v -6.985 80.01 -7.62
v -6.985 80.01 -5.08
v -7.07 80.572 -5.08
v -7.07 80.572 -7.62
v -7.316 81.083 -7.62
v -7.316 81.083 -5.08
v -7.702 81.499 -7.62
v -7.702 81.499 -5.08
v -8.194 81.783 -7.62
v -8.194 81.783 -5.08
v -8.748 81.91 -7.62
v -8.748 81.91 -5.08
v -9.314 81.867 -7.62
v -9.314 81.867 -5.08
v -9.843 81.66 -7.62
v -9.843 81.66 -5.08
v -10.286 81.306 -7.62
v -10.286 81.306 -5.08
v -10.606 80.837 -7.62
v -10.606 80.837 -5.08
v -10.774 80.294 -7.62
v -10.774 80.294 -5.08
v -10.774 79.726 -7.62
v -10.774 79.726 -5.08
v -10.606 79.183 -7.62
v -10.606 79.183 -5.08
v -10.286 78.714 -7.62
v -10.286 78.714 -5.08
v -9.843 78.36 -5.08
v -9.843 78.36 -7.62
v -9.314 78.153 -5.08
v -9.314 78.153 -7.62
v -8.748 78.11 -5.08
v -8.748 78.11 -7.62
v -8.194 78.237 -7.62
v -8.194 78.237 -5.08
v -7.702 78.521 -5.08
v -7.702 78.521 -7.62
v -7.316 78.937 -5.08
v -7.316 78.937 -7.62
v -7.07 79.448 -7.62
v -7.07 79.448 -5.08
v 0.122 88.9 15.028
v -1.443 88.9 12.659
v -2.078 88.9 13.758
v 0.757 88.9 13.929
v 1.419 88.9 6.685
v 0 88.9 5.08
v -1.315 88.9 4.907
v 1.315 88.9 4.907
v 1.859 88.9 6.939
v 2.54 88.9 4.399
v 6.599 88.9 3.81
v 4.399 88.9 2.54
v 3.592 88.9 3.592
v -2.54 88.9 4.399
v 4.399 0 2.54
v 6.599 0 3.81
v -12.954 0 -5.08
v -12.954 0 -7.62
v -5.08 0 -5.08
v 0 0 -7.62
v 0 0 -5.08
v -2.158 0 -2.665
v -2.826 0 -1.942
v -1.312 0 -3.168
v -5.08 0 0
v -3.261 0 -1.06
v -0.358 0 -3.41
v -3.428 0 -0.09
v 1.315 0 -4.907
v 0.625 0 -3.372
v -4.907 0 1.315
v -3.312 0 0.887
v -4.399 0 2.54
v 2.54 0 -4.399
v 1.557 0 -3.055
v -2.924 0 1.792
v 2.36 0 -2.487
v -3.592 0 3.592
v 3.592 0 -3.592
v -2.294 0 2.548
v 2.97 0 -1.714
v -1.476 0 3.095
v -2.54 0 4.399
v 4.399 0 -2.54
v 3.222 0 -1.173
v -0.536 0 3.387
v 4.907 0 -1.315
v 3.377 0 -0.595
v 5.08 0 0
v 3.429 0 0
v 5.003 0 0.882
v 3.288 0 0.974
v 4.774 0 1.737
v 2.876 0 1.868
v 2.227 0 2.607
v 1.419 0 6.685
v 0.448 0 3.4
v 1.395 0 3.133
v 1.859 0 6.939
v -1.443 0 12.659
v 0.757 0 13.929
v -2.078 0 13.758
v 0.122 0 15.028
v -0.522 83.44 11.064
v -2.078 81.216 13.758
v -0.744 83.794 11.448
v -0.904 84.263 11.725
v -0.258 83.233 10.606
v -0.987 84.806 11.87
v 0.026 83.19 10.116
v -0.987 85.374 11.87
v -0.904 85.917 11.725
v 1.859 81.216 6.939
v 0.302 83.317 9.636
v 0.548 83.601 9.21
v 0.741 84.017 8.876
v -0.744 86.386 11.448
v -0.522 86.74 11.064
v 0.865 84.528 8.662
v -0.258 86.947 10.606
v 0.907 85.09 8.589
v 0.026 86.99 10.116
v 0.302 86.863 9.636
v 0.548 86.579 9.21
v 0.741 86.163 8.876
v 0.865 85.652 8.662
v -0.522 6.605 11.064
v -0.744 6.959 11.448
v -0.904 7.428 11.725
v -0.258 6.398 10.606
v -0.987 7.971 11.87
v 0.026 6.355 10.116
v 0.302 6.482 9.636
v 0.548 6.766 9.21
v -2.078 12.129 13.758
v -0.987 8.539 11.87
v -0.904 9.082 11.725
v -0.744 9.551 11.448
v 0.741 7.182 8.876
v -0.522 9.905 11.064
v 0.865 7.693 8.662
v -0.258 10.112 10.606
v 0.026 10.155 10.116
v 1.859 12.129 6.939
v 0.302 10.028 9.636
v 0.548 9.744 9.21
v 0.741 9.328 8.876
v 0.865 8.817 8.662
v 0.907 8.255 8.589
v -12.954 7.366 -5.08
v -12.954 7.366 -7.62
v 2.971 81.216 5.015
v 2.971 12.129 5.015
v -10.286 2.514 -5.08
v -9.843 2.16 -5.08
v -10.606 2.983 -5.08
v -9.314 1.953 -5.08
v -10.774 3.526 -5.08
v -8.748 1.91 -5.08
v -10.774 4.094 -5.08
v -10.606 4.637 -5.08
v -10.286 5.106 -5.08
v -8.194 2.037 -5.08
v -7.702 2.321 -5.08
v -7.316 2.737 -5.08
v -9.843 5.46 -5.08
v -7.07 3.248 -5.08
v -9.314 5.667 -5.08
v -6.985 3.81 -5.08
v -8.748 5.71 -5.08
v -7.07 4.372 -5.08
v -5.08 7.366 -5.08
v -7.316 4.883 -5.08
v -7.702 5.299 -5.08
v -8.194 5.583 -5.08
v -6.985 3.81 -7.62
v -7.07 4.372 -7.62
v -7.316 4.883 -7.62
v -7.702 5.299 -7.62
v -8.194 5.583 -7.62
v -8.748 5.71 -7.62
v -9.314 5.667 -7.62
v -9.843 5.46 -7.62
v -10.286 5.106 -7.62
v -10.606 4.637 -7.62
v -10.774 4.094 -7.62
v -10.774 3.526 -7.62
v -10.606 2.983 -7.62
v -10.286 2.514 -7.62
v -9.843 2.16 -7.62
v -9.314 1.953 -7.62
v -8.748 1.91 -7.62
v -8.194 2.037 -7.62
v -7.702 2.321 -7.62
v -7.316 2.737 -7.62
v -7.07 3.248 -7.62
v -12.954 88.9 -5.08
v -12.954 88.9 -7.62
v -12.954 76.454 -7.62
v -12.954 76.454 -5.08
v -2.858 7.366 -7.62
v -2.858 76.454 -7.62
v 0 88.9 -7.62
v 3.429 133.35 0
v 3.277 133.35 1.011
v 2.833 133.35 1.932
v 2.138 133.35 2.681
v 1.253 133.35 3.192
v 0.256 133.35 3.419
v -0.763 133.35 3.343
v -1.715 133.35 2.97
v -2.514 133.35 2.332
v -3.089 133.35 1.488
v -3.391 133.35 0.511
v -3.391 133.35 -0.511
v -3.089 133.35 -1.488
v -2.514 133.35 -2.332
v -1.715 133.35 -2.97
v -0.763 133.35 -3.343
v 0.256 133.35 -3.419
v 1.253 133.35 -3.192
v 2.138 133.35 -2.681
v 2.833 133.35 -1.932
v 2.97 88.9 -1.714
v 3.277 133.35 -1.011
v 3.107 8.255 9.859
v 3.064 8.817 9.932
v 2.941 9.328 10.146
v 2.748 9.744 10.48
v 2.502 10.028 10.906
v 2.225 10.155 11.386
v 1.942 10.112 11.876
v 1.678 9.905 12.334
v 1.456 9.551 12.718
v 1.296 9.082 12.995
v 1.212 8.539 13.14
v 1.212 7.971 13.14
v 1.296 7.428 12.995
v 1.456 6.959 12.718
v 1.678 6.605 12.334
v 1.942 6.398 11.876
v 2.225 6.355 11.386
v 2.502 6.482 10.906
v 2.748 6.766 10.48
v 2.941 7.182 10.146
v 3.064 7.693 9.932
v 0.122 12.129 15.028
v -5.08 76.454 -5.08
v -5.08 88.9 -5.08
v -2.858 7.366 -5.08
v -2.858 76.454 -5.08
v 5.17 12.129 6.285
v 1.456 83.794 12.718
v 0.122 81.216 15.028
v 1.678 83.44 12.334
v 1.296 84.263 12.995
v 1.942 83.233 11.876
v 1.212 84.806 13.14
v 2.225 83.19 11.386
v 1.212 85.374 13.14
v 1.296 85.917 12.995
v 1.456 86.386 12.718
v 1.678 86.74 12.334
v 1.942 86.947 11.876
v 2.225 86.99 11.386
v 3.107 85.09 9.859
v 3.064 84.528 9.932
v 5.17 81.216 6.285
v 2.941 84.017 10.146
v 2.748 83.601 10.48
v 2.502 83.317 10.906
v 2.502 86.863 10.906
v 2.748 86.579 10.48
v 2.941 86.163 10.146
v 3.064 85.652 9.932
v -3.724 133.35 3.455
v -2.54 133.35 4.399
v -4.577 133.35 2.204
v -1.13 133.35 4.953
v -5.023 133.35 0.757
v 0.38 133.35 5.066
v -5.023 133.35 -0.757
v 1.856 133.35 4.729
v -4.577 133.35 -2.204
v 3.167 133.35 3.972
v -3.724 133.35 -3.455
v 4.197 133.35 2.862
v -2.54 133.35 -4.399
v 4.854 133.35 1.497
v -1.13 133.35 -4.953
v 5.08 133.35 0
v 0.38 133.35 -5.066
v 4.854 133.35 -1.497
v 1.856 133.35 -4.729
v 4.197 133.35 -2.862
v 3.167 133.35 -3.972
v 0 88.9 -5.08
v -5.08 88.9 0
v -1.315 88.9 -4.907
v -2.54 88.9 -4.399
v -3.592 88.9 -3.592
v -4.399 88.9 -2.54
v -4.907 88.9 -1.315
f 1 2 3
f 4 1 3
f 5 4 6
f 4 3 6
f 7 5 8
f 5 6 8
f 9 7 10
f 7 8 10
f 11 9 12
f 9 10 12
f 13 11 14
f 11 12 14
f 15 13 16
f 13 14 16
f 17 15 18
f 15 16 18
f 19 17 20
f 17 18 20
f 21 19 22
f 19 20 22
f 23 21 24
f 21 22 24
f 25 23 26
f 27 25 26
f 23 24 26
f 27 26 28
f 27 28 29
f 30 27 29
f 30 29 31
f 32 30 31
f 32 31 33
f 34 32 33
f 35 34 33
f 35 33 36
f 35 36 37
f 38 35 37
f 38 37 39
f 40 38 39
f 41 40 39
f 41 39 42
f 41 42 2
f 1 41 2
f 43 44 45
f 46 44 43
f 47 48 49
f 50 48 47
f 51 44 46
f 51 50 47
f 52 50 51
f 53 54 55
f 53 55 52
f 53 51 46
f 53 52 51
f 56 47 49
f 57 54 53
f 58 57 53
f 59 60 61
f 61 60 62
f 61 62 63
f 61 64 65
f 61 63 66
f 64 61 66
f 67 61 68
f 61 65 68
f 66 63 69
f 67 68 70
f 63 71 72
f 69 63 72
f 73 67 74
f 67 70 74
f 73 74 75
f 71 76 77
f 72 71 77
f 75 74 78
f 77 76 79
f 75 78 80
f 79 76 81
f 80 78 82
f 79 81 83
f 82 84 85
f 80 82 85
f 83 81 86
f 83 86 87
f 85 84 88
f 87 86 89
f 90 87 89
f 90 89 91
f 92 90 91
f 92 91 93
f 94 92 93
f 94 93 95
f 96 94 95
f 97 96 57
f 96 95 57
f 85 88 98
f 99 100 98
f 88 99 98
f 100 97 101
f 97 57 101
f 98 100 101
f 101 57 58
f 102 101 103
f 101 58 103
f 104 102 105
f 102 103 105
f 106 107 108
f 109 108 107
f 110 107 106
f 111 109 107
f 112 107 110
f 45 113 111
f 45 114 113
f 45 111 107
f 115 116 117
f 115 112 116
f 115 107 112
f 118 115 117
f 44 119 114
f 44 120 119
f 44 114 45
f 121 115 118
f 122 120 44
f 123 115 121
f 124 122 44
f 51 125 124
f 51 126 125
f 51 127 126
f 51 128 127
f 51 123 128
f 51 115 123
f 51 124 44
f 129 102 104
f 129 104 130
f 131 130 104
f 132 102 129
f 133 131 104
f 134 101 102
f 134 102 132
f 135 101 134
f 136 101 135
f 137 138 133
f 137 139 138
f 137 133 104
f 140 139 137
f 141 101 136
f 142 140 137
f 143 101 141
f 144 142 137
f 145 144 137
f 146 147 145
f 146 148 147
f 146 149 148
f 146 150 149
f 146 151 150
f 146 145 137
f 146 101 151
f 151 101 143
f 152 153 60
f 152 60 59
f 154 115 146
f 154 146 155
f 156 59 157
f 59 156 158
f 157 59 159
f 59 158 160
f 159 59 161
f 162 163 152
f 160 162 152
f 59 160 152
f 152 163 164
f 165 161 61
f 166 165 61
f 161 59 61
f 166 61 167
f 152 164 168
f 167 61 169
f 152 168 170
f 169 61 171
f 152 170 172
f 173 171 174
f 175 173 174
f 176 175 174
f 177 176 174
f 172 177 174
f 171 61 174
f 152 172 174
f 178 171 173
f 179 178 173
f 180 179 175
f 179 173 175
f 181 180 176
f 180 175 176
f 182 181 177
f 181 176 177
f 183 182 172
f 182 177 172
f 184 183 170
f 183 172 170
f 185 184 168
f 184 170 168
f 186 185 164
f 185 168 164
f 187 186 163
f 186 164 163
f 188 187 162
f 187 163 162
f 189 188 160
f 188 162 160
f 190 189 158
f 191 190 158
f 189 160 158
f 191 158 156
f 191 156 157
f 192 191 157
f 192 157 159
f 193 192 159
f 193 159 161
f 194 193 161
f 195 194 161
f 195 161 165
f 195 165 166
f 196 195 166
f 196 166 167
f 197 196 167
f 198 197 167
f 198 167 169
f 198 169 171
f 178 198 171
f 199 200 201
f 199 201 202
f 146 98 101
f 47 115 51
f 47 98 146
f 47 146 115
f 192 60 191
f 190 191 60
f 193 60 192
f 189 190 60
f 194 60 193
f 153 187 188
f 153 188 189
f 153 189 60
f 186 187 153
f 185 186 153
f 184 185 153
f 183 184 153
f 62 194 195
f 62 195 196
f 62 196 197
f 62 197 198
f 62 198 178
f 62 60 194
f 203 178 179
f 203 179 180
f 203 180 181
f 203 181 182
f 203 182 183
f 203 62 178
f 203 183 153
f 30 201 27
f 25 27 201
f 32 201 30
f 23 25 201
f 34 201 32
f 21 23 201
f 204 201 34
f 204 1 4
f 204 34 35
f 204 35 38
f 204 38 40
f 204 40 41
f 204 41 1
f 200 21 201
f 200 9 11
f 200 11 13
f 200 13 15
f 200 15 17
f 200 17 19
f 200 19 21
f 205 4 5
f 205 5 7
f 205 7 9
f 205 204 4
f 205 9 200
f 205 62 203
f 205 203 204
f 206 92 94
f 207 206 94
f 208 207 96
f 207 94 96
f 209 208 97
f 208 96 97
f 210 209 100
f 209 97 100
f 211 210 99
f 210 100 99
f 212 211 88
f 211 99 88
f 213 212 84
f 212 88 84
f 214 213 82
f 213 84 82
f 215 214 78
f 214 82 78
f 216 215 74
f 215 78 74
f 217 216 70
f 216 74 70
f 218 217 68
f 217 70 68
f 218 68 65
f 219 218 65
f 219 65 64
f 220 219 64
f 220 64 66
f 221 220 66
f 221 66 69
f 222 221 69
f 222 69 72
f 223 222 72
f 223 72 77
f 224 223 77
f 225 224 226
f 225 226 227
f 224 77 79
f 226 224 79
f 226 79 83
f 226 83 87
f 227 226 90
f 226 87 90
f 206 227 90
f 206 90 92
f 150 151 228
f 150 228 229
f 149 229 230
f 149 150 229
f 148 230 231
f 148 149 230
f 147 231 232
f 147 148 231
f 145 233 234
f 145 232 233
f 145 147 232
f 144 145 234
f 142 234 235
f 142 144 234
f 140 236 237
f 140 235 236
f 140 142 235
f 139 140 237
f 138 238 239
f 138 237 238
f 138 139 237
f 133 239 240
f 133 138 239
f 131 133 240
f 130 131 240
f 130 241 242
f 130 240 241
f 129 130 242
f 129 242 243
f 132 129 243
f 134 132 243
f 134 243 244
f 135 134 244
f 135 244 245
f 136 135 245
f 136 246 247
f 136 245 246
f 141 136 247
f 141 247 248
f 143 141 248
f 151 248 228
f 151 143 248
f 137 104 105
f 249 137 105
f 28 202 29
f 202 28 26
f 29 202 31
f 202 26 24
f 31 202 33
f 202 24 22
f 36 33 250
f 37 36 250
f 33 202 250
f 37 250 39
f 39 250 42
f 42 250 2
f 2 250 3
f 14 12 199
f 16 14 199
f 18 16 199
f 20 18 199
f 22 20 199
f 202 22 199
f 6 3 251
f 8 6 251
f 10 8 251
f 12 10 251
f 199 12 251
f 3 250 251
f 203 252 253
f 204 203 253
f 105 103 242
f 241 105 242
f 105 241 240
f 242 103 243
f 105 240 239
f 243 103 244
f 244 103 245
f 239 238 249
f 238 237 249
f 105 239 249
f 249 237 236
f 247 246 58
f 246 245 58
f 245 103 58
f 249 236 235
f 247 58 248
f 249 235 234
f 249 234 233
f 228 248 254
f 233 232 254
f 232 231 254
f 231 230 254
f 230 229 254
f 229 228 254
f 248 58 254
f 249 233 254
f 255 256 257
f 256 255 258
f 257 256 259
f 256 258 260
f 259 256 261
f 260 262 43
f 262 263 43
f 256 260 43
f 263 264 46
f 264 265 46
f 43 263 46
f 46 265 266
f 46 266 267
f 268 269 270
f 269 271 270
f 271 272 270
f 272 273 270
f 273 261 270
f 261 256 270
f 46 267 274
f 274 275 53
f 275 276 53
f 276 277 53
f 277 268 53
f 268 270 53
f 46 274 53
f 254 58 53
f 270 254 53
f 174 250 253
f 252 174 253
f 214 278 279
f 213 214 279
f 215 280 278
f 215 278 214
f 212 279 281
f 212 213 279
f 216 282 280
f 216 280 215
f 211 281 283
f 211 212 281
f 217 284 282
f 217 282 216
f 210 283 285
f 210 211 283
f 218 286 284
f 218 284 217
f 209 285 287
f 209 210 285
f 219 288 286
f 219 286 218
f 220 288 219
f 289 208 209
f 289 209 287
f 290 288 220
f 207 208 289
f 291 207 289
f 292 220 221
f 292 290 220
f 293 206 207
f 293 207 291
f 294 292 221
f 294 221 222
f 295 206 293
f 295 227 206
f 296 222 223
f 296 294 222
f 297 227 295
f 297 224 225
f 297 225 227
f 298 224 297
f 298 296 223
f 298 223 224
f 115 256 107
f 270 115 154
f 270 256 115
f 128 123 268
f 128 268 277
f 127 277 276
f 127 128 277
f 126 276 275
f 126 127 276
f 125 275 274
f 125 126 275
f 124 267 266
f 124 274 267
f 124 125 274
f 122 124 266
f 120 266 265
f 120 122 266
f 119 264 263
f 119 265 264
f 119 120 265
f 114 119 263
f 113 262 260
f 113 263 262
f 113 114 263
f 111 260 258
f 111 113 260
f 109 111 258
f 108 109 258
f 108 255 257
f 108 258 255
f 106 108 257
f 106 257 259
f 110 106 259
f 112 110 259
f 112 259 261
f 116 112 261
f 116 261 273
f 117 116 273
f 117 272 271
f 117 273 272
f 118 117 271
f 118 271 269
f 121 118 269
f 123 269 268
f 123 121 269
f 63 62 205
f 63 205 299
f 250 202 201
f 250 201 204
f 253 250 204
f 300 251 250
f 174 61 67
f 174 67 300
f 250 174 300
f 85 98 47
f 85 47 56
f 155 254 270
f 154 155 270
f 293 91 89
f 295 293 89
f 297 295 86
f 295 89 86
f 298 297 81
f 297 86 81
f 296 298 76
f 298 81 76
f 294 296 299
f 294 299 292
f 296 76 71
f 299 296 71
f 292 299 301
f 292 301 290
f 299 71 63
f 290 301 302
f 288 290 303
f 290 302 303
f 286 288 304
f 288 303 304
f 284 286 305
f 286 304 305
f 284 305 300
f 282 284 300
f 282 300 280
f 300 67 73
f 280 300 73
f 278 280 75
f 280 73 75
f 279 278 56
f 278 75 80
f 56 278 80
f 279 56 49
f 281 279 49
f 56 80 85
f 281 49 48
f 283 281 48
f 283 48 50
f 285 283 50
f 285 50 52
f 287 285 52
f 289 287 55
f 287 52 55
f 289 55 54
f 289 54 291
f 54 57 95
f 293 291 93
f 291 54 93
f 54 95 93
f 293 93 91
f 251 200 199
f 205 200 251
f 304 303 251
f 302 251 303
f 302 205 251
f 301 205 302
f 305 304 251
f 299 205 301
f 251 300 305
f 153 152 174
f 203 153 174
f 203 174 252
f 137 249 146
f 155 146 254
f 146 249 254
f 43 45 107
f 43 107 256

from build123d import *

# Parameters (mm, degrees)
SKETCH1_R           = 5.08
BOSS_EXTRUDE1_DEPTH = 133.35
SKETCH2_R           = 3.429
CUT_EXTRUDE1_DEPTH  = 134.35
BOSS_EXTRUDE2_DEPTH = 88.9
HOLE_CUTS_1_REACH   = 12.16
SKETCH4_R           = 1.905
HOLE_CUTS_2_REACH   = 17.219
SKETCH7_R           = 1.905
CUT_EXTRUDE7_REACH  = 135.35
SKETCH8_W           = 6.604
SKETCH8_H           = 4.572
SKETCH9_W           = 11.684
SKETCH9_H           = 88.9
CUT_EXTRUDE8_DEPTH  = 2.54
SKETCH10_W          = 11.684
SKETCH10_H          = 88.9
CUT_EXTRUDE9_DEPTH  = 2.54
SKETCH11_W          = 6.604
SKETCH11_H          = 88.9
CUT_EXTRUDE10_DEPTH = 0.508
SKETCH13_W          = 6.604
SKETCH13_H          = 88.9
CUT_EXTRUDE11_DEPTH = 0.508
SKETCH14_W          = 2.54
SKETCH14_H          = 88.9
BOSS_EXTRUDE3_DEPTH = 1.27
SKETCH15_W          = 2.54
SKETCH15_H          = 88.9
BOSS_EXTRUDE4_DEPTH = 1.27
SKETCH20_W          = 10.0965
SKETCH20_H          = 69.088
CUT_EXTRUDE13_DEPTH = 2.54
SKETCH21_W          = 10.0965
SKETCH21_H          = 69.088
CUT_EXTRUDE14_DEPTH = 2.54


with BuildPart() as part:
    # Sketch1 → Boss-Extrude1 (new body)
    with BuildSketch(Plane(origin=(0, 0, 0), x_dir=(1, 0, 0), z_dir=(0, 1, 0))):
        Circle(SKETCH1_R)
    extrude(amount=BOSS_EXTRUDE1_DEPTH)

    # Sketch2 → Cut-Extrude1 (cut, through all)
    with BuildSketch(Plane.XZ):
        Circle(SKETCH2_R)
    extrude(amount=-CUT_EXTRUDE1_DEPTH, mode=Mode.SUBTRACT)

    # Sketch3 → Boss-Extrude2 (add)
    with BuildSketch(Plane.XZ):
        with BuildLine():
            Line((-1.442590949, 12.658640818), (-5.842, 10.118640818))
            Line((-5.842, 10.118640818), (-2.54, 4.399409051))
            ThreePointArc((-2.54, 4.399409051), (2.96960111, -1.7145), (-5.08, 0))
            Line((-5.08, 0), (-11.684, 0))
            Line((-11.684, 0), (-11.684, -5.08))
            Line((-11.684, -5.08), (-11.684, -10.16))
            Line((-11.684, -10.16), (0, -10.16))
            Line((0, -10.16), (0, -5.08))
            ThreePointArc((0, -5.08), (4.399409051, -2.54), (4.399409051, 2.54))
            Line((4.399409051, 2.54), (8.798818102, 5.08))
            Line((8.798818102, 5.08), (2.956818102, 15.198640818))
            Line((2.956818102, 15.198640818), (-1.442590949, 12.658640818))
        make_face()
    extrude(amount=-BOSS_EXTRUDE2_DEPTH)

    # Sketch4 → Hole Cuts 1 (cut, up to next)
    with BuildSketch(Plane.XY, mode=Mode.PRIVATE) as hole_cuts_1_sk1:
        with Locations((-8.89, 80.01)):
            Circle(SKETCH4_R)
    hole_cuts_1_tool1 = extrude(hole_cuts_1_sk1.sketch, amount=-HOLE_CUTS_1_REACH, mode=Mode.PRIVATE) & part.part
    add(hole_cuts_1_tool1.solids().sort_by_distance((-8.89, 80.01, 0))[0], mode=Mode.SUBTRACT)
    # Sketch4 → Hole Cuts 1 (cut, up to next)
    with BuildSketch(Plane.XY, mode=Mode.PRIVATE) as hole_cuts_1_sk2:
        with Locations((-8.89, 3.81)):
            Circle(SKETCH4_R)
    hole_cuts_1_tool2 = extrude(hole_cuts_1_sk2.sketch, amount=-HOLE_CUTS_1_REACH, mode=Mode.PRIVATE) & part.part
    add(hole_cuts_1_tool2.solids().sort_by_distance((-8.89, 3.81, 0))[0], mode=Mode.SUBTRACT)

    # Sketch7 → Hole Cuts 2 (cut, up to next)
    with BuildSketch(Plane(origin=(0, 0, 0), x_dir=(0.5, 0, -0.866025404), z_dir=(0.866025404, 0, 0.5)), mode=Mode.PRIVATE) as hole_cuts_2_sk1:
        with Locations((-8.89, 85.09)):
            Circle(SKETCH7_R)
    hole_cuts_2_tool1 = extrude(hole_cuts_2_sk1.sketch, amount=HOLE_CUTS_2_REACH, mode=Mode.PRIVATE) & part.part
    add(hole_cuts_2_tool1.solids().sort_by_distance((-4.445, 85.09, 7.698966))[0], mode=Mode.SUBTRACT)
    # Sketch7 → Hole Cuts 2 (cut, up to next)
    with BuildSketch(Plane(origin=(0, 0, 0), x_dir=(0.5, 0, -0.866025404), z_dir=(0.866025404, 0, 0.5)), mode=Mode.PRIVATE) as hole_cuts_2_sk2:
        with Locations((-8.89, 8.255)):
            Circle(SKETCH7_R)
    hole_cuts_2_tool2 = extrude(hole_cuts_2_sk2.sketch, amount=HOLE_CUTS_2_REACH, mode=Mode.PRIVATE) & part.part
    add(hole_cuts_2_tool2.solids().sort_by_distance((-4.445, 8.255, 7.698966))[0], mode=Mode.SUBTRACT)

    # Sketch8 → Cut-Extrude7 (cut, up to next)
    with BuildSketch(Plane.XZ, mode=Mode.PRIVATE) as cut_extrude7_sk1:
        Polygon((-5.842, 10.118640818), (-1.882531854, 12.404640818), (1.419468146, 6.685409051), (-2.54, 4.399409051), align=None)
    cut_extrude7_tool1 = extrude(cut_extrude7_sk1.sketch, amount=-CUT_EXTRUDE7_REACH, mode=Mode.PRIVATE) & part.part
    add(cut_extrude7_tool1.solids().sort_by_distance((-2.211266, 0, 8.402025))[0], mode=Mode.SUBTRACT)
    # Sketch8 → Cut-Extrude7 (cut, up to next)
    with BuildSketch(Plane.XZ, mode=Mode.PRIVATE) as cut_extrude7_sk2:
        with Locations((-8.382, -2.286)):
            Rectangle(SKETCH8_W, SKETCH8_H)
    cut_extrude7_tool2 = extrude(cut_extrude7_sk2.sketch, amount=-CUT_EXTRUDE7_REACH, mode=Mode.PRIVATE) & part.part
    add(cut_extrude7_tool2.solids().sort_by_distance((-8.382, 0, -2.286))[0], mode=Mode.SUBTRACT)

    # Sketch9 → Cut-Extrude8 (cut)
    with BuildSketch(Plane(origin=(0, 0, -10.16), x_dir=(-1, 0, 0), z_dir=(0, 0, -1))):
        with Locations((5.842, 44.45)):
            Rectangle(SKETCH9_W, SKETCH9_H)
    extrude(amount=-CUT_EXTRUDE8_DEPTH, mode=Mode.SUBTRACT)

    # Sketch10 → Cut-Extrude9 (cut)
    with BuildSketch(Plane(origin=(8.798818102, 0, 5.08), x_dir=(0.5, 0, -0.866025404), z_dir=(0.866025404, 0, 0.5))):
        with Locations((-5.842, 44.45)):
            Rectangle(SKETCH10_W, SKETCH10_H)
    extrude(amount=-CUT_EXTRUDE9_DEPTH, mode=Mode.SUBTRACT)

    # Sketch11 → Cut-Extrude10 (cut)
    with BuildSketch(Plane.XY.offset(-4.572)):
        with Locations((-8.382, 44.45)):
            Rectangle(SKETCH11_W, SKETCH11_H)
    extrude(amount=-CUT_EXTRUDE10_DEPTH, mode=Mode.SUBTRACT)

    # Sketch13 → Cut-Extrude11 (cut)
    with BuildSketch(Plane(origin=(3.959468146, 0, 2.286), x_dir=(-0.5, 0, 0.866025404), z_dir=(-0.866025404, 0, -0.5))):
        with Locations((8.382, 44.45)):
            Rectangle(SKETCH13_W, SKETCH13_H)
    extrude(amount=-CUT_EXTRUDE11_DEPTH, mode=Mode.SUBTRACT)

    # Sketch14 → Boss-Extrude3 (add)
    with BuildSketch(Plane(origin=(-5.842, 0, 10.118640818), x_dir=(0.866025404, 0, 0.5), z_dir=(-0.5, 0, 0.866025404))):
        with Locations((6.35, 44.45)):
            Rectangle(SKETCH14_W, SKETCH14_H)
    extrude(amount=BOSS_EXTRUDE3_DEPTH)

    # Sketch15 → Boss-Extrude4 (add)
    with BuildSketch(Plane.ZY.offset(11.684)):
        with Locations((-6.35, 44.45)):
            Rectangle(SKETCH15_W, SKETCH15_H)
    extrude(amount=BOSS_EXTRUDE4_DEPTH)

    # Sketch20 → Cut-Extrude13 (cut)
    with BuildSketch(Plane.XY.offset(-5.08)):
        with Locations((-7.90575, 41.91)):
            Rectangle(SKETCH20_W, SKETCH20_H)
    extrude(amount=-CUT_EXTRUDE13_DEPTH, mode=Mode.SUBTRACT)

    # Sketch21 → Cut-Extrude14 (cut)
    with BuildSketch(Plane(origin=(6.599113577, 0, 3.81), x_dir=(0.5, 0, -0.866025404), z_dir=(0.866025404, 0, 0.5))):
        with Locations((-7.90575, 46.6725)):
            Rectangle(SKETCH21_W, SKETCH21_H)
    extrude(amount=-CUT_EXTRUDE14_DEPTH, mode=Mode.SUBTRACT)


solid = part.part
